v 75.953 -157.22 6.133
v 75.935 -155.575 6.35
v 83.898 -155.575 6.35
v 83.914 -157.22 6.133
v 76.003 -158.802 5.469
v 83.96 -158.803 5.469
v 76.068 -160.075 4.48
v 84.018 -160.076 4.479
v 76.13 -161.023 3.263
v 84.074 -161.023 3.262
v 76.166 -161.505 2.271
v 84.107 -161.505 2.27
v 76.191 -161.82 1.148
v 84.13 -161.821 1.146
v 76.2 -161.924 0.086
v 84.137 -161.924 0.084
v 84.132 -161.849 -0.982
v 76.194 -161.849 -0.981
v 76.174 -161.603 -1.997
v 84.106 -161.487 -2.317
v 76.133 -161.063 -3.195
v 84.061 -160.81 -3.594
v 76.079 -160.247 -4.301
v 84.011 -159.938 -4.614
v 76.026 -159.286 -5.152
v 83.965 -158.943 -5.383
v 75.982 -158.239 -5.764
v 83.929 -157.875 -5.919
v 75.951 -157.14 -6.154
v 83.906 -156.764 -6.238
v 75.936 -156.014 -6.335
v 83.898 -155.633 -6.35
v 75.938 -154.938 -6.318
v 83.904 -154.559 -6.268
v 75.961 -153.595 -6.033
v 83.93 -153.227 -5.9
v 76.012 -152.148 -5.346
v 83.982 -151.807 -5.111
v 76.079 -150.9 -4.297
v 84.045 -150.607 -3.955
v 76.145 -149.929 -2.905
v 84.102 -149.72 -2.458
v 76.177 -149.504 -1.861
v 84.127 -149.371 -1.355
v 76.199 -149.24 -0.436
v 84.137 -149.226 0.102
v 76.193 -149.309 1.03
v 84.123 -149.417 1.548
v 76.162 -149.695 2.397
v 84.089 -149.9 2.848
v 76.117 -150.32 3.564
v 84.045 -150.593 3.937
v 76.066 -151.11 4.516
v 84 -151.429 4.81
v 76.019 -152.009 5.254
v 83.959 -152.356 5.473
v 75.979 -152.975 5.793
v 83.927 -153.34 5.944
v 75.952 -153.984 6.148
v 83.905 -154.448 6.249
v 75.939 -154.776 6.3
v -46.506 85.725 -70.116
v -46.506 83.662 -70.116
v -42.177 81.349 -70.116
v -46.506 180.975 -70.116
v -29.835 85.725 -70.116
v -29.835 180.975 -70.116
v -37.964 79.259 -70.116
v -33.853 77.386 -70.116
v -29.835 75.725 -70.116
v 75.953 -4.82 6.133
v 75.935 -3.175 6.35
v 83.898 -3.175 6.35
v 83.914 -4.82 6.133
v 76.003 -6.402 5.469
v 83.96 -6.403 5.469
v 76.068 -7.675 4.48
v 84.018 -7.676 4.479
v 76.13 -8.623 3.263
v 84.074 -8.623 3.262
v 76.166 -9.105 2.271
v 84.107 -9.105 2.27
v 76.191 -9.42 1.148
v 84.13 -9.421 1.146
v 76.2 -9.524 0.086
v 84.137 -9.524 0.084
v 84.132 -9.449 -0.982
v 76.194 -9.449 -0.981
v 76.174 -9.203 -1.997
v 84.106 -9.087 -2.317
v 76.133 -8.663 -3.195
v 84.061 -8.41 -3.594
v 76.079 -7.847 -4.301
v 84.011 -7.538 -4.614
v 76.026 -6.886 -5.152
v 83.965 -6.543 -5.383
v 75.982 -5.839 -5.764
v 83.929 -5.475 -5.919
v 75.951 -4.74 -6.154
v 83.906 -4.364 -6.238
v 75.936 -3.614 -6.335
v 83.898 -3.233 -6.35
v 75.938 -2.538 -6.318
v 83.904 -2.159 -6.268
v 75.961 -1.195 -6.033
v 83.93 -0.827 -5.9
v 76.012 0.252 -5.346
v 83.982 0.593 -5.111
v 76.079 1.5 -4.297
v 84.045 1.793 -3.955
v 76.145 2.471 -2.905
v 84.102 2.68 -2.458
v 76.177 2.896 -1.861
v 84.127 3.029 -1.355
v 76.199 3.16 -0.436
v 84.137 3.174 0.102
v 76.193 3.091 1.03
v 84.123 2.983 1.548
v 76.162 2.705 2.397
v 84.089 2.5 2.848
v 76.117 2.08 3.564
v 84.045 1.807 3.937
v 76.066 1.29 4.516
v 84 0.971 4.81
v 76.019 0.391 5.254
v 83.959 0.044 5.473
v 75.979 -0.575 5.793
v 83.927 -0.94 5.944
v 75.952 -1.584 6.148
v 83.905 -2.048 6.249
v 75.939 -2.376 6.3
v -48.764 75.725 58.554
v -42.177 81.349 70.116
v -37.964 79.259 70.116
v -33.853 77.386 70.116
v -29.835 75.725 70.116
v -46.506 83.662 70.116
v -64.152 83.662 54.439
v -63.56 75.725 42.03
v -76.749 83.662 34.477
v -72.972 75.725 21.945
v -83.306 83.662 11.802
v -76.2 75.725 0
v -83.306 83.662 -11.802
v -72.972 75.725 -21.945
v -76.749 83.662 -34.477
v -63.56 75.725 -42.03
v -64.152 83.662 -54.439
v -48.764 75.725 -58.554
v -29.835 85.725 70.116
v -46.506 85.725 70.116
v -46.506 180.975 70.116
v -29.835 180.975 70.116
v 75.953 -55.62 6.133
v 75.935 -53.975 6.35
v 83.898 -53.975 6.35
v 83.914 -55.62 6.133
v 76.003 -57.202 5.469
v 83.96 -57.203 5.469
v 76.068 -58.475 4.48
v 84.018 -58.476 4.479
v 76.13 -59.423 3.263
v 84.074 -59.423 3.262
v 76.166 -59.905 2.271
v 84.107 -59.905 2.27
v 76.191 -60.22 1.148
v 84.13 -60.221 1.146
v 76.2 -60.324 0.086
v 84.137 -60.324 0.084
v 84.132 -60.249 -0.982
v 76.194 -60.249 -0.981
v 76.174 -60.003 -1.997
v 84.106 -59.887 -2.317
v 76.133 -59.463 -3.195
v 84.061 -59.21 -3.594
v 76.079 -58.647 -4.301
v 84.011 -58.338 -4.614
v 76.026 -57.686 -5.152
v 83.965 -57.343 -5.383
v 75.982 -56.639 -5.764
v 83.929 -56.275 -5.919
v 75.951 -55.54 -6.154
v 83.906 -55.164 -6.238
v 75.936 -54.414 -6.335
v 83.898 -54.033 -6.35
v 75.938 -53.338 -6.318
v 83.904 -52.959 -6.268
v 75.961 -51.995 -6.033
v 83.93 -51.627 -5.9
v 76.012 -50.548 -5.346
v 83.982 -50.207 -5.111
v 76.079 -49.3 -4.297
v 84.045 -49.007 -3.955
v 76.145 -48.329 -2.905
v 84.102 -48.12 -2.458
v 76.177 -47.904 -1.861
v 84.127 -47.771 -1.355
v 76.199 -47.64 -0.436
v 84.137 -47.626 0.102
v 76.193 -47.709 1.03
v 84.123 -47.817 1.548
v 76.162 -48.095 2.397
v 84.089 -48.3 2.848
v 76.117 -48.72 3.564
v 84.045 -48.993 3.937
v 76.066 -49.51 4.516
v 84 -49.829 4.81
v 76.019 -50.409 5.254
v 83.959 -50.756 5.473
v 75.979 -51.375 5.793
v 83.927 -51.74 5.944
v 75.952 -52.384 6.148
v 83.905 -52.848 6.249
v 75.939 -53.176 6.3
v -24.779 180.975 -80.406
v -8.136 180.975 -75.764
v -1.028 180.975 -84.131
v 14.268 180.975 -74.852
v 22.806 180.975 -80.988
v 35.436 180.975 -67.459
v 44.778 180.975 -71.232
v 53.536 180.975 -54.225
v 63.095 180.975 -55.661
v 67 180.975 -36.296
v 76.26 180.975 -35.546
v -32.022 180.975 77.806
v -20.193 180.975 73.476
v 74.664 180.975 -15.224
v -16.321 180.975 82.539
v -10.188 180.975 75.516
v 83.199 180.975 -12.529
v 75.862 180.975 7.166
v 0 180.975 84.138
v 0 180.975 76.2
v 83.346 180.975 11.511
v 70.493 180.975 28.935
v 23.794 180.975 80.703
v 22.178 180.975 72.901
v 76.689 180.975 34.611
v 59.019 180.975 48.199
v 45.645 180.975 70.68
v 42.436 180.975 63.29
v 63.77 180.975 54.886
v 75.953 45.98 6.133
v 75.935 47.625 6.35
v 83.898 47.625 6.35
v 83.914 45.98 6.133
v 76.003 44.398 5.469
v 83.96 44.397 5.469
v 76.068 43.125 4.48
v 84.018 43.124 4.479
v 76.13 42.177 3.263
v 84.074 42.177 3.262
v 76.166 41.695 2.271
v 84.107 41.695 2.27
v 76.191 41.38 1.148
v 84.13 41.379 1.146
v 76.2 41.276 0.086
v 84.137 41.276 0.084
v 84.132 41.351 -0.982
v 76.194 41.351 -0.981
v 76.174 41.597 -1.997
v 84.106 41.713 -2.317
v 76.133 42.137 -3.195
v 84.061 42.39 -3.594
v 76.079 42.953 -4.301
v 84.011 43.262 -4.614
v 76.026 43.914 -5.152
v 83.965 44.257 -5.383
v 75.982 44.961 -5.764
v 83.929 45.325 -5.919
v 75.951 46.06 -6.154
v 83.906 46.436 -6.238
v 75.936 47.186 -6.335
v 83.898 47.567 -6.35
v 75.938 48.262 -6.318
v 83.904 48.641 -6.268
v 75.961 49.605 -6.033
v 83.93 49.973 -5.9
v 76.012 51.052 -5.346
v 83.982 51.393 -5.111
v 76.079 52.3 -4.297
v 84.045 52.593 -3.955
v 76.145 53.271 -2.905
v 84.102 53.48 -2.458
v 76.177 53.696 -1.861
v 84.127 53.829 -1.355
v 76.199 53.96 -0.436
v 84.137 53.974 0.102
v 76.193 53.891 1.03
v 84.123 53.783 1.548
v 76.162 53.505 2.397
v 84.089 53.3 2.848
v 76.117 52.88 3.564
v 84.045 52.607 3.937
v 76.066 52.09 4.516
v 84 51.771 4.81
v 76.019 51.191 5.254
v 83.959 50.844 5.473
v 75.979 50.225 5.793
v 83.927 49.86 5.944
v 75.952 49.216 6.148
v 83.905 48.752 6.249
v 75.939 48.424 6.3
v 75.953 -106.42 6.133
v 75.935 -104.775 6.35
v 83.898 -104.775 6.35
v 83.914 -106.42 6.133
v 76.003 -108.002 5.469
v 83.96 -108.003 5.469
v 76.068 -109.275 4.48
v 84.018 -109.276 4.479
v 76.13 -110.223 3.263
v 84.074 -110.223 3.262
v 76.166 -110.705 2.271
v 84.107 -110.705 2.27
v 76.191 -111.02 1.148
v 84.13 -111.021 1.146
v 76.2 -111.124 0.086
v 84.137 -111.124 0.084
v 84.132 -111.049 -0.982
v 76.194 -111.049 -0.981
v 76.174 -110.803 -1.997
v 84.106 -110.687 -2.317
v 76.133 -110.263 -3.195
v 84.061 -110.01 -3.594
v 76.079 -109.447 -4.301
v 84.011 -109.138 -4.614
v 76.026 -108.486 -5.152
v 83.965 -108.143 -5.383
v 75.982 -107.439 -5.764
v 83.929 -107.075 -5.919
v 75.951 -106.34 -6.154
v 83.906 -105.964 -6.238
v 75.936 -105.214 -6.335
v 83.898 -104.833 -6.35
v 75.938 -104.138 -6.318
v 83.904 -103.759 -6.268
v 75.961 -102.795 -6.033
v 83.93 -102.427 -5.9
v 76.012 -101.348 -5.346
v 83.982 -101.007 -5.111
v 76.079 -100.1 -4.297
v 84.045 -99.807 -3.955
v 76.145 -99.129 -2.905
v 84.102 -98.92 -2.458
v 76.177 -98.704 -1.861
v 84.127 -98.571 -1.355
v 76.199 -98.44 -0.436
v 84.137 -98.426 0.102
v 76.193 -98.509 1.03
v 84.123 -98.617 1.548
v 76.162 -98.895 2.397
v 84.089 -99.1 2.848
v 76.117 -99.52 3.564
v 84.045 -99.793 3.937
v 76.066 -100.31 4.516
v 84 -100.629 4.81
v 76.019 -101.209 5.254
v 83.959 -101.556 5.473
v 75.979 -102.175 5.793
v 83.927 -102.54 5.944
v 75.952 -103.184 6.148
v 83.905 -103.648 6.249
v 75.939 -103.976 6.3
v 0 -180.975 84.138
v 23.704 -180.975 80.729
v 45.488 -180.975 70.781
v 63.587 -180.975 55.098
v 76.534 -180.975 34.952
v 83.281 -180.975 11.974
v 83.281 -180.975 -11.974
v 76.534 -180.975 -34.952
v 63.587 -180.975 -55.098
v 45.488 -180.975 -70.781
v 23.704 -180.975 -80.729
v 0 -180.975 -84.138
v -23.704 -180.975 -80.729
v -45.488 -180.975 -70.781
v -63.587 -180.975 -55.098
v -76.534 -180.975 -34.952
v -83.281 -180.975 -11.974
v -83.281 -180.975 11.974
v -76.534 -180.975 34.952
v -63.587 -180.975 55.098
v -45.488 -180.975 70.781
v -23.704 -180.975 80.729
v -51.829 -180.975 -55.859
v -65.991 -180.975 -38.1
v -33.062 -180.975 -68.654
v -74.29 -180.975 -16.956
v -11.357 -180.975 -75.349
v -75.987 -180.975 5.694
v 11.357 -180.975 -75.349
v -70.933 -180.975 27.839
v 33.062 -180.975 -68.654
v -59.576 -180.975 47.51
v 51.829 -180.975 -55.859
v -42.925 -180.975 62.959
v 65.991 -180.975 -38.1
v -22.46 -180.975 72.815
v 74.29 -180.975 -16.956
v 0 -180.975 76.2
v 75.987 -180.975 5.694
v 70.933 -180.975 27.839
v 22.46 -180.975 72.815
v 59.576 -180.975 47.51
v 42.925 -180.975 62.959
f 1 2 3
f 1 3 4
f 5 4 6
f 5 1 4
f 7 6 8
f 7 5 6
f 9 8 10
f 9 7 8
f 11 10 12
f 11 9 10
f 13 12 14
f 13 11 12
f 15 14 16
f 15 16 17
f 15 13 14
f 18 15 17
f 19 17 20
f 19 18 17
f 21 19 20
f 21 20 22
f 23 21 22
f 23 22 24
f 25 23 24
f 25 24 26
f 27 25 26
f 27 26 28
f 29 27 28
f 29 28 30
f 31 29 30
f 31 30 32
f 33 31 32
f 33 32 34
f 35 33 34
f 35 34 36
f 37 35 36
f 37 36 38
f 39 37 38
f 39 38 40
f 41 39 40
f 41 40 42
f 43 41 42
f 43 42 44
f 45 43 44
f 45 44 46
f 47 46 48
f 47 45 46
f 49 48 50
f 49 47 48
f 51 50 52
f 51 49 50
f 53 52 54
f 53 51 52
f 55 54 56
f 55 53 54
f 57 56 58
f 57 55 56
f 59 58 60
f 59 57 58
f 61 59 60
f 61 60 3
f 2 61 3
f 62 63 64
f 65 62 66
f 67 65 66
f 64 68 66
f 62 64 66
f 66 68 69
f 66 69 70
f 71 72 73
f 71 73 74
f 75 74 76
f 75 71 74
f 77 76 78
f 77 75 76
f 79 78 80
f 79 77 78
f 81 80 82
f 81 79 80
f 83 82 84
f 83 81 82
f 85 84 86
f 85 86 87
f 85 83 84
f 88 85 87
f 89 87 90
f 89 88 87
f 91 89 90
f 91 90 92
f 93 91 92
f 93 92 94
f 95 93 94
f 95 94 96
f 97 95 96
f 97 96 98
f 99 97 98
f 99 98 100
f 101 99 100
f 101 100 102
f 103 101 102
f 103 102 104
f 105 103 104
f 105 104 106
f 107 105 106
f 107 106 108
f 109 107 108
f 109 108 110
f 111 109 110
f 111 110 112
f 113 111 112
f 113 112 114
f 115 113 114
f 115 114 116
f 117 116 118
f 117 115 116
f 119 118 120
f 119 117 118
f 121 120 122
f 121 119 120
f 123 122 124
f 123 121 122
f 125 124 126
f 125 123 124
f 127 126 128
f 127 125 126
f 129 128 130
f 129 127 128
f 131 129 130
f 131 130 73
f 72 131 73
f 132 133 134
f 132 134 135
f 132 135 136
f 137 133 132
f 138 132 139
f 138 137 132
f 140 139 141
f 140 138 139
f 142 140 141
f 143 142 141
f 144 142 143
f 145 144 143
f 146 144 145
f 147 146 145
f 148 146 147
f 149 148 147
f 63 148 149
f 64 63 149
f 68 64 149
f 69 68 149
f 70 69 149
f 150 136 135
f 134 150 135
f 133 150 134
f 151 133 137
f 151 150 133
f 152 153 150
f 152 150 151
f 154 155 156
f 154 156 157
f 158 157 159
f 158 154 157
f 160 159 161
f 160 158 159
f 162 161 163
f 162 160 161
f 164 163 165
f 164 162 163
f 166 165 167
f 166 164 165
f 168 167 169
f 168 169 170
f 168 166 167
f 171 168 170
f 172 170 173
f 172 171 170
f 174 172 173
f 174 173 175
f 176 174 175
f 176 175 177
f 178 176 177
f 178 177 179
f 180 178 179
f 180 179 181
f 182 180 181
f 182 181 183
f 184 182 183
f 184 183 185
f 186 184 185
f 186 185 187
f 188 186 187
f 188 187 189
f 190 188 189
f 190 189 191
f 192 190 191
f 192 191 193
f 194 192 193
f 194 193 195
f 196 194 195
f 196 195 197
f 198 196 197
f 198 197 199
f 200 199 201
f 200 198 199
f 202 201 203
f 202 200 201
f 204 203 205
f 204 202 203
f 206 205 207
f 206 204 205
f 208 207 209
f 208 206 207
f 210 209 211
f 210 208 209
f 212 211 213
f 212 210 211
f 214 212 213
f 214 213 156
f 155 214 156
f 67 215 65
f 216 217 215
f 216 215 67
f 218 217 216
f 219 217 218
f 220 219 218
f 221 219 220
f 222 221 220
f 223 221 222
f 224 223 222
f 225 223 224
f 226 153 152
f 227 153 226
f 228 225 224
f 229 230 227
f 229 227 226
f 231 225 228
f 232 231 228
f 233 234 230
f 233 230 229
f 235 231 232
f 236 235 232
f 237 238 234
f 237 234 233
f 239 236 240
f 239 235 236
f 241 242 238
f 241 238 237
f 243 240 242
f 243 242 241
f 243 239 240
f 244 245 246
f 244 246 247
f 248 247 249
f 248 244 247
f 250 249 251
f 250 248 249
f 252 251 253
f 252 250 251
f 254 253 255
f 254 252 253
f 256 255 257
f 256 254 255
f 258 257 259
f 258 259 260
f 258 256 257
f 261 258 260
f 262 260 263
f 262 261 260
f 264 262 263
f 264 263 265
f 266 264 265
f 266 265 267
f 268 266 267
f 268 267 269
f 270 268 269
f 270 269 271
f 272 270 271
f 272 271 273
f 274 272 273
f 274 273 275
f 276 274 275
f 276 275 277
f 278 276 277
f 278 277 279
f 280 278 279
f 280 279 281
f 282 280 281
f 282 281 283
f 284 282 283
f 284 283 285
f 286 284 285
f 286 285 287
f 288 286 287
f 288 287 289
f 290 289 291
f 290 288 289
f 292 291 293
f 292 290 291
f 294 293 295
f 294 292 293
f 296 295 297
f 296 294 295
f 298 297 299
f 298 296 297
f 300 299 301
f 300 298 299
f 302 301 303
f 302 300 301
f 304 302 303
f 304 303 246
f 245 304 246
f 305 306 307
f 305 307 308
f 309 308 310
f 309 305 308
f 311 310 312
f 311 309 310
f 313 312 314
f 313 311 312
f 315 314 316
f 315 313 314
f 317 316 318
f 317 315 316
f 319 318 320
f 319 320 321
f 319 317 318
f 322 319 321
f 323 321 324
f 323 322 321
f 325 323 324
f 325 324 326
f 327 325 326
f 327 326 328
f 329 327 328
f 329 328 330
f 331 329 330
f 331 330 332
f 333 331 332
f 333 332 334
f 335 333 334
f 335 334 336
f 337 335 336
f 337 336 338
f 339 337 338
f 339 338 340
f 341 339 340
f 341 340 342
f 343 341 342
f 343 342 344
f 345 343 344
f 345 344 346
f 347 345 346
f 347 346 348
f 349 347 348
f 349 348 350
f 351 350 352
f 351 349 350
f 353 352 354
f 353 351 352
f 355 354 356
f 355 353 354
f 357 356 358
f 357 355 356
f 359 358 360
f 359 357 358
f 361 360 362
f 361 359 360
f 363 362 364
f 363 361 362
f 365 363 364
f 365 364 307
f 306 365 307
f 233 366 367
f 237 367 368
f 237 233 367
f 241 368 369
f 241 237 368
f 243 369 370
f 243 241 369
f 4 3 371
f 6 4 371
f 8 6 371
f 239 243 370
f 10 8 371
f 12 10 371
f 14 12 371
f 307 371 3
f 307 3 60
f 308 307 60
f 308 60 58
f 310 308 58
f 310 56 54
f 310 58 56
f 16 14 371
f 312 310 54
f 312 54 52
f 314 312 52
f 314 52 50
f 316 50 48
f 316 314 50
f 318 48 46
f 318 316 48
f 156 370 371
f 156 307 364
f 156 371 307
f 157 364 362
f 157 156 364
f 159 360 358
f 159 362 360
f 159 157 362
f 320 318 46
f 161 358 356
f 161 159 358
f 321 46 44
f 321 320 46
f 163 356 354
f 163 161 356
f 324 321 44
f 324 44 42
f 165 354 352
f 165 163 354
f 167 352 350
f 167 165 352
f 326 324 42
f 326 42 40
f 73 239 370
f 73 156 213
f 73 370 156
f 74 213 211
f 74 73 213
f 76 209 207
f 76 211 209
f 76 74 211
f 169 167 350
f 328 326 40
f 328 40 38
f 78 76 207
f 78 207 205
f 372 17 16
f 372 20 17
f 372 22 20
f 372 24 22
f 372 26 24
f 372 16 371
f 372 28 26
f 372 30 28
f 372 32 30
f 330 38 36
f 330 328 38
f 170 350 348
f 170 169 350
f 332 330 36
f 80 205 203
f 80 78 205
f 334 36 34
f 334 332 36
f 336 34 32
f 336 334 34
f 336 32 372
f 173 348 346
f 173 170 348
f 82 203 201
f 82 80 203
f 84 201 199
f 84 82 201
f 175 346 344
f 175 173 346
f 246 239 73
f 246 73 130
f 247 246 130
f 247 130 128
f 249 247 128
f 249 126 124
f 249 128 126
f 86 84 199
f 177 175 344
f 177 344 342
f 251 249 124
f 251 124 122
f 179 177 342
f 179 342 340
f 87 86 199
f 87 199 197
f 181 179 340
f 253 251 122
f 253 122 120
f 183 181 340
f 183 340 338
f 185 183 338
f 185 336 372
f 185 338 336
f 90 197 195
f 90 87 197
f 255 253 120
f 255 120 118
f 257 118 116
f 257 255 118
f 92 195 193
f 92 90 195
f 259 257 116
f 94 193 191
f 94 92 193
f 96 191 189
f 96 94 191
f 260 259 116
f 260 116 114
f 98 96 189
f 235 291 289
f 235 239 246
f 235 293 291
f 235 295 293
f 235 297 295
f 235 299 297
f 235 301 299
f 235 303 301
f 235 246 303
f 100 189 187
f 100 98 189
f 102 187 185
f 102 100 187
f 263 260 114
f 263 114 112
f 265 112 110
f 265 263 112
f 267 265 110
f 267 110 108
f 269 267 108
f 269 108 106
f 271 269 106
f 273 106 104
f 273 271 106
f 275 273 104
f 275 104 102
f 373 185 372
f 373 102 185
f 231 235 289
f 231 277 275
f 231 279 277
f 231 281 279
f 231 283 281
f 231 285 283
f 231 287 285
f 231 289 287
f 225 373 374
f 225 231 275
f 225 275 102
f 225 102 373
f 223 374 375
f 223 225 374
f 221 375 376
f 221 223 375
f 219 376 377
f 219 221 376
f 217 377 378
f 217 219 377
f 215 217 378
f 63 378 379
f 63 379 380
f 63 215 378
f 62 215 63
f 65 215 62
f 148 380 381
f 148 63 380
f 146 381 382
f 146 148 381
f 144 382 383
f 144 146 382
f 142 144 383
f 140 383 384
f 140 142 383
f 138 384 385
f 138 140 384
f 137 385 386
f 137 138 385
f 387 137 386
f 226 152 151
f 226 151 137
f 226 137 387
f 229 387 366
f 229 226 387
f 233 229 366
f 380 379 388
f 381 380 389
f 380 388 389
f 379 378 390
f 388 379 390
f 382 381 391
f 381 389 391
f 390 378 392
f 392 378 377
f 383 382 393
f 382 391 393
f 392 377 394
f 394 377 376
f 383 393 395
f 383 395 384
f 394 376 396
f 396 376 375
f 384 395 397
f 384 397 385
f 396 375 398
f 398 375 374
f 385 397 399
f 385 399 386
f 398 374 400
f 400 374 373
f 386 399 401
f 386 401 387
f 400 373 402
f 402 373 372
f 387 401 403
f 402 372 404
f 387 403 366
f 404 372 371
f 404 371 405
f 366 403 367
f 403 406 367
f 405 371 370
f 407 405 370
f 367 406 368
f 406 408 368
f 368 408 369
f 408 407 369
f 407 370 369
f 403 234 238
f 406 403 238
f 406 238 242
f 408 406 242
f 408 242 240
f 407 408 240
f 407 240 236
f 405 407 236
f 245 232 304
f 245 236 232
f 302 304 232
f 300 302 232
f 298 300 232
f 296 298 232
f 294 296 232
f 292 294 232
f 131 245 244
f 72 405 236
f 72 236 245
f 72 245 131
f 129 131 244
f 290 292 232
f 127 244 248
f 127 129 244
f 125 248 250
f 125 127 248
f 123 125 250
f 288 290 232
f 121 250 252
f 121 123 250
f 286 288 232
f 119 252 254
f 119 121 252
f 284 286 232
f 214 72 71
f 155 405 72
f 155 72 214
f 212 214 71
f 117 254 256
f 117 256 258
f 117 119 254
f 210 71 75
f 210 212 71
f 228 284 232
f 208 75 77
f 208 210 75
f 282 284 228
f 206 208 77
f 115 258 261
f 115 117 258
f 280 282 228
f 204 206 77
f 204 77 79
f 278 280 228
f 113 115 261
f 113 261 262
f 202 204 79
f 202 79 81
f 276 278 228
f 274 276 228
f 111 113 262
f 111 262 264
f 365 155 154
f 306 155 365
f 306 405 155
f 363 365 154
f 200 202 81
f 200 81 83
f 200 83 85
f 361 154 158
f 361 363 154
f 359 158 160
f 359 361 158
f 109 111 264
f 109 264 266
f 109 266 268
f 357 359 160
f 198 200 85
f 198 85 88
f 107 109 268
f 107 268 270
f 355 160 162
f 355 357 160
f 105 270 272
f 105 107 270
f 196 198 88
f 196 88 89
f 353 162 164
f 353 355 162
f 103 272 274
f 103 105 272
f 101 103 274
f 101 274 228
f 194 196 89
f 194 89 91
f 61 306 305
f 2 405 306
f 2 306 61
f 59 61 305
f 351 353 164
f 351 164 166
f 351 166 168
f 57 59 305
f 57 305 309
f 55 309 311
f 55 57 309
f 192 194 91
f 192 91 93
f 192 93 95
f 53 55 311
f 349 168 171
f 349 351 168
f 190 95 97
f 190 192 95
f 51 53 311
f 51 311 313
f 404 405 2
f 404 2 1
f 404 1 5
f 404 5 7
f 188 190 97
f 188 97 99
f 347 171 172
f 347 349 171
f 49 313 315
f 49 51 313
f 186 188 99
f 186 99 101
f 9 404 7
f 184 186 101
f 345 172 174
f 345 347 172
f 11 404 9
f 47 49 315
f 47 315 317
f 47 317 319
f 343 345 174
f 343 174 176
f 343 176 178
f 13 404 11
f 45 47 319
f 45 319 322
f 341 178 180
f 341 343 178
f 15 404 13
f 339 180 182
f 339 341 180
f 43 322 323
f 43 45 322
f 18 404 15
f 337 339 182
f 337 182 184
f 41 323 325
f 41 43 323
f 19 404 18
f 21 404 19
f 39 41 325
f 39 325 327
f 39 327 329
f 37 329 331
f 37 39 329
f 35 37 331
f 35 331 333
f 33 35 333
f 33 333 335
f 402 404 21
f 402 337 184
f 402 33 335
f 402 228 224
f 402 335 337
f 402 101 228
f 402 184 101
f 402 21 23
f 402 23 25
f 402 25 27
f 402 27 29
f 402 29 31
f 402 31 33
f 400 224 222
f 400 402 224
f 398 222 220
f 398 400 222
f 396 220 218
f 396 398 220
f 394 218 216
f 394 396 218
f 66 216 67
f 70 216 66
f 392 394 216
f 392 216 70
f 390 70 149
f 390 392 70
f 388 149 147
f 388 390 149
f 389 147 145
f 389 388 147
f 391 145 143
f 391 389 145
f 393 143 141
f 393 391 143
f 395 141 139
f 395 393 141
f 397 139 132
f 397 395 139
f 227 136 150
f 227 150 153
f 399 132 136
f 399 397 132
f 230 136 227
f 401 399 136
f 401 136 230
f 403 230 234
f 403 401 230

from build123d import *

# Parameters (mm, degrees)
SKETCH1_R           = 84.1375
SKETCH1_R_2         = 76.2
BOSS_EXTRUDE1_DEPTH = 180.975
CUT_EXTRUDE1_DEPTH  = 95.25
CUT_EXTRUDE2_START  = -95.25
CUT_EXTRUDE2_DEPTH  = 95.25
CHAMFER2_SIZE       = 10
SKETCH7_R           = 6.35
CUT_EXTRUDE9_DEPTH  = 95.25


with BuildPart() as part:
    # Sketch1 → Boss-Extrude1 (new, symmetric)
    with BuildSketch(Plane(origin=(0, 0, 0), x_dir=(1, 0, 0), z_dir=(0, 1, 0))):
        with Locations(Location((0, 0, 0), (0, 0, 270))):
            Circle(SKETCH1_R)
        with Locations(Location((0, 0, 0), (0, 0, 270))):
            Circle(SKETCH1_R_2, mode=Mode.SUBTRACT)
    extrude(amount=BOSS_EXTRUDE1_DEPTH, both=True)

    # Sketch2 → Cut-Extrude1 (cut)
    with BuildSketch(Plane(origin=(0, 180.975, 0), x_dir=(1, 0, 0), z_dir=(0, 1, 0))):
        with BuildLine():
            Line((0, 0), (-42.123694676, 63.498301921))
            Line((-42.123694676, 63.498301921), (-46.505926486, 70.116458181))
            ThreePointArc((-46.505926486, 70.116458181), (-84.1375, 0), (-46.505926486, -70.116458181))
            Line((-46.505926486, -70.116458181), (-42.118574931, -63.501697976))
            Line((-42.118574931, -63.501697976), (0, 0))
        make_face()
    extrude(amount=-CUT_EXTRUDE1_DEPTH, mode=Mode.SUBTRACT)

    # Sketch3 → Cut-Extrude2 (cut)
    with BuildSketch(Plane(origin=(0, 180.975, 0), x_dir=(1, 0, 0), z_dir=(0, 1, 0)).offset(CUT_EXTRUDE2_START)):
        with BuildLine():
            Line((-46.505926486, -70.116458181), (-29.83491733, -70.116458181))
            ThreePointArc((-29.83491733, -70.116458181), (-36.128451742, -67.090796498), (-42.118574931, -63.501697976))
            Line((-42.118574931, -63.501697976), (-46.505926486, -70.116458181))
        make_face()
        with BuildLine():
            Line((-46.505926486, 70.116458181), (-29.83491733, 70.116458181))
            ThreePointArc((-29.83491733, 70.116458181), (-36.131156341, 67.089339999), (-42.123694676, 63.498301921))
            Line((-42.123694676, 63.498301921), (-46.505926486, 70.116458181))
        make_face()
    extrude(amount=CUT_EXTRUDE2_DEPTH, mode=Mode.SUBTRACT)

    # Chamfer2
    # the kernel refuses this chamfer: 10 mm, written as the material it takes off along each edge
    with BuildSketch(Plane(origin=(0, 85.725, 0), x_dir=(-0.0644623510736034, 0, 0.9979201397376763), z_dir=(0.9979201397376763, 0, 0.0644623510736034))) as chamfer2_piece_1_section:
        Polygon((76.2, CHAMFER2_SIZE), (76.2 + CHAMFER2_SIZE, 0), (76.2, 0), align=None)
    chamfer2_piece_1 = revolve(axis=Axis((0, 85.725, 0), (0, -1, 0)), revolution_arc=172.608033228, mode=Mode.PRIVATE)
    chamfer2_piece_1 = split(chamfer2_piece_1, bisect_by=Plane(origin=(-81.050363846, 80.874636154, 70.116458181), z_dir=(0, 0, -1)), keep=Keep.TOP, mode=Mode.PRIVATE)
    chamfer2_piece_1 = split(chamfer2_piece_1, bisect_by=Plane(origin=(-81.050363846, 80.874636154, -70.116458181), z_dir=(0, 0, 1)), keep=Keep.TOP, mode=Mode.PRIVATE)
    add(chamfer2_piece_1, mode=Mode.SUBTRACT)

    # Sketch7 → Cut-Extrude9 (cut)
    with BuildSketch(Plane(origin=(0, 0, 0), x_dir=(0, 0, -1), z_dir=(1, 0, 0))):
        with Locations(Location((0, 47.625, 0), (0, 0, 180))):
            Circle(SKETCH7_R)
        with Locations(Location((0, -3.175, 0), (0, 0, 180))):
            Circle(SKETCH7_R)
        with Locations(Location((0, -53.975, 0), (0, 0, 180))):
            Circle(SKETCH7_R)
        with Locations(Location((0, -104.775, 0), (0, 0, 180))):
            Circle(SKETCH7_R)
        with Locations(Location((0, -155.575, 0), (0, 0, 180))):
            Circle(SKETCH7_R)
    extrude(amount=CUT_EXTRUDE9_DEPTH, mode=Mode.SUBTRACT)


solid = part.part
